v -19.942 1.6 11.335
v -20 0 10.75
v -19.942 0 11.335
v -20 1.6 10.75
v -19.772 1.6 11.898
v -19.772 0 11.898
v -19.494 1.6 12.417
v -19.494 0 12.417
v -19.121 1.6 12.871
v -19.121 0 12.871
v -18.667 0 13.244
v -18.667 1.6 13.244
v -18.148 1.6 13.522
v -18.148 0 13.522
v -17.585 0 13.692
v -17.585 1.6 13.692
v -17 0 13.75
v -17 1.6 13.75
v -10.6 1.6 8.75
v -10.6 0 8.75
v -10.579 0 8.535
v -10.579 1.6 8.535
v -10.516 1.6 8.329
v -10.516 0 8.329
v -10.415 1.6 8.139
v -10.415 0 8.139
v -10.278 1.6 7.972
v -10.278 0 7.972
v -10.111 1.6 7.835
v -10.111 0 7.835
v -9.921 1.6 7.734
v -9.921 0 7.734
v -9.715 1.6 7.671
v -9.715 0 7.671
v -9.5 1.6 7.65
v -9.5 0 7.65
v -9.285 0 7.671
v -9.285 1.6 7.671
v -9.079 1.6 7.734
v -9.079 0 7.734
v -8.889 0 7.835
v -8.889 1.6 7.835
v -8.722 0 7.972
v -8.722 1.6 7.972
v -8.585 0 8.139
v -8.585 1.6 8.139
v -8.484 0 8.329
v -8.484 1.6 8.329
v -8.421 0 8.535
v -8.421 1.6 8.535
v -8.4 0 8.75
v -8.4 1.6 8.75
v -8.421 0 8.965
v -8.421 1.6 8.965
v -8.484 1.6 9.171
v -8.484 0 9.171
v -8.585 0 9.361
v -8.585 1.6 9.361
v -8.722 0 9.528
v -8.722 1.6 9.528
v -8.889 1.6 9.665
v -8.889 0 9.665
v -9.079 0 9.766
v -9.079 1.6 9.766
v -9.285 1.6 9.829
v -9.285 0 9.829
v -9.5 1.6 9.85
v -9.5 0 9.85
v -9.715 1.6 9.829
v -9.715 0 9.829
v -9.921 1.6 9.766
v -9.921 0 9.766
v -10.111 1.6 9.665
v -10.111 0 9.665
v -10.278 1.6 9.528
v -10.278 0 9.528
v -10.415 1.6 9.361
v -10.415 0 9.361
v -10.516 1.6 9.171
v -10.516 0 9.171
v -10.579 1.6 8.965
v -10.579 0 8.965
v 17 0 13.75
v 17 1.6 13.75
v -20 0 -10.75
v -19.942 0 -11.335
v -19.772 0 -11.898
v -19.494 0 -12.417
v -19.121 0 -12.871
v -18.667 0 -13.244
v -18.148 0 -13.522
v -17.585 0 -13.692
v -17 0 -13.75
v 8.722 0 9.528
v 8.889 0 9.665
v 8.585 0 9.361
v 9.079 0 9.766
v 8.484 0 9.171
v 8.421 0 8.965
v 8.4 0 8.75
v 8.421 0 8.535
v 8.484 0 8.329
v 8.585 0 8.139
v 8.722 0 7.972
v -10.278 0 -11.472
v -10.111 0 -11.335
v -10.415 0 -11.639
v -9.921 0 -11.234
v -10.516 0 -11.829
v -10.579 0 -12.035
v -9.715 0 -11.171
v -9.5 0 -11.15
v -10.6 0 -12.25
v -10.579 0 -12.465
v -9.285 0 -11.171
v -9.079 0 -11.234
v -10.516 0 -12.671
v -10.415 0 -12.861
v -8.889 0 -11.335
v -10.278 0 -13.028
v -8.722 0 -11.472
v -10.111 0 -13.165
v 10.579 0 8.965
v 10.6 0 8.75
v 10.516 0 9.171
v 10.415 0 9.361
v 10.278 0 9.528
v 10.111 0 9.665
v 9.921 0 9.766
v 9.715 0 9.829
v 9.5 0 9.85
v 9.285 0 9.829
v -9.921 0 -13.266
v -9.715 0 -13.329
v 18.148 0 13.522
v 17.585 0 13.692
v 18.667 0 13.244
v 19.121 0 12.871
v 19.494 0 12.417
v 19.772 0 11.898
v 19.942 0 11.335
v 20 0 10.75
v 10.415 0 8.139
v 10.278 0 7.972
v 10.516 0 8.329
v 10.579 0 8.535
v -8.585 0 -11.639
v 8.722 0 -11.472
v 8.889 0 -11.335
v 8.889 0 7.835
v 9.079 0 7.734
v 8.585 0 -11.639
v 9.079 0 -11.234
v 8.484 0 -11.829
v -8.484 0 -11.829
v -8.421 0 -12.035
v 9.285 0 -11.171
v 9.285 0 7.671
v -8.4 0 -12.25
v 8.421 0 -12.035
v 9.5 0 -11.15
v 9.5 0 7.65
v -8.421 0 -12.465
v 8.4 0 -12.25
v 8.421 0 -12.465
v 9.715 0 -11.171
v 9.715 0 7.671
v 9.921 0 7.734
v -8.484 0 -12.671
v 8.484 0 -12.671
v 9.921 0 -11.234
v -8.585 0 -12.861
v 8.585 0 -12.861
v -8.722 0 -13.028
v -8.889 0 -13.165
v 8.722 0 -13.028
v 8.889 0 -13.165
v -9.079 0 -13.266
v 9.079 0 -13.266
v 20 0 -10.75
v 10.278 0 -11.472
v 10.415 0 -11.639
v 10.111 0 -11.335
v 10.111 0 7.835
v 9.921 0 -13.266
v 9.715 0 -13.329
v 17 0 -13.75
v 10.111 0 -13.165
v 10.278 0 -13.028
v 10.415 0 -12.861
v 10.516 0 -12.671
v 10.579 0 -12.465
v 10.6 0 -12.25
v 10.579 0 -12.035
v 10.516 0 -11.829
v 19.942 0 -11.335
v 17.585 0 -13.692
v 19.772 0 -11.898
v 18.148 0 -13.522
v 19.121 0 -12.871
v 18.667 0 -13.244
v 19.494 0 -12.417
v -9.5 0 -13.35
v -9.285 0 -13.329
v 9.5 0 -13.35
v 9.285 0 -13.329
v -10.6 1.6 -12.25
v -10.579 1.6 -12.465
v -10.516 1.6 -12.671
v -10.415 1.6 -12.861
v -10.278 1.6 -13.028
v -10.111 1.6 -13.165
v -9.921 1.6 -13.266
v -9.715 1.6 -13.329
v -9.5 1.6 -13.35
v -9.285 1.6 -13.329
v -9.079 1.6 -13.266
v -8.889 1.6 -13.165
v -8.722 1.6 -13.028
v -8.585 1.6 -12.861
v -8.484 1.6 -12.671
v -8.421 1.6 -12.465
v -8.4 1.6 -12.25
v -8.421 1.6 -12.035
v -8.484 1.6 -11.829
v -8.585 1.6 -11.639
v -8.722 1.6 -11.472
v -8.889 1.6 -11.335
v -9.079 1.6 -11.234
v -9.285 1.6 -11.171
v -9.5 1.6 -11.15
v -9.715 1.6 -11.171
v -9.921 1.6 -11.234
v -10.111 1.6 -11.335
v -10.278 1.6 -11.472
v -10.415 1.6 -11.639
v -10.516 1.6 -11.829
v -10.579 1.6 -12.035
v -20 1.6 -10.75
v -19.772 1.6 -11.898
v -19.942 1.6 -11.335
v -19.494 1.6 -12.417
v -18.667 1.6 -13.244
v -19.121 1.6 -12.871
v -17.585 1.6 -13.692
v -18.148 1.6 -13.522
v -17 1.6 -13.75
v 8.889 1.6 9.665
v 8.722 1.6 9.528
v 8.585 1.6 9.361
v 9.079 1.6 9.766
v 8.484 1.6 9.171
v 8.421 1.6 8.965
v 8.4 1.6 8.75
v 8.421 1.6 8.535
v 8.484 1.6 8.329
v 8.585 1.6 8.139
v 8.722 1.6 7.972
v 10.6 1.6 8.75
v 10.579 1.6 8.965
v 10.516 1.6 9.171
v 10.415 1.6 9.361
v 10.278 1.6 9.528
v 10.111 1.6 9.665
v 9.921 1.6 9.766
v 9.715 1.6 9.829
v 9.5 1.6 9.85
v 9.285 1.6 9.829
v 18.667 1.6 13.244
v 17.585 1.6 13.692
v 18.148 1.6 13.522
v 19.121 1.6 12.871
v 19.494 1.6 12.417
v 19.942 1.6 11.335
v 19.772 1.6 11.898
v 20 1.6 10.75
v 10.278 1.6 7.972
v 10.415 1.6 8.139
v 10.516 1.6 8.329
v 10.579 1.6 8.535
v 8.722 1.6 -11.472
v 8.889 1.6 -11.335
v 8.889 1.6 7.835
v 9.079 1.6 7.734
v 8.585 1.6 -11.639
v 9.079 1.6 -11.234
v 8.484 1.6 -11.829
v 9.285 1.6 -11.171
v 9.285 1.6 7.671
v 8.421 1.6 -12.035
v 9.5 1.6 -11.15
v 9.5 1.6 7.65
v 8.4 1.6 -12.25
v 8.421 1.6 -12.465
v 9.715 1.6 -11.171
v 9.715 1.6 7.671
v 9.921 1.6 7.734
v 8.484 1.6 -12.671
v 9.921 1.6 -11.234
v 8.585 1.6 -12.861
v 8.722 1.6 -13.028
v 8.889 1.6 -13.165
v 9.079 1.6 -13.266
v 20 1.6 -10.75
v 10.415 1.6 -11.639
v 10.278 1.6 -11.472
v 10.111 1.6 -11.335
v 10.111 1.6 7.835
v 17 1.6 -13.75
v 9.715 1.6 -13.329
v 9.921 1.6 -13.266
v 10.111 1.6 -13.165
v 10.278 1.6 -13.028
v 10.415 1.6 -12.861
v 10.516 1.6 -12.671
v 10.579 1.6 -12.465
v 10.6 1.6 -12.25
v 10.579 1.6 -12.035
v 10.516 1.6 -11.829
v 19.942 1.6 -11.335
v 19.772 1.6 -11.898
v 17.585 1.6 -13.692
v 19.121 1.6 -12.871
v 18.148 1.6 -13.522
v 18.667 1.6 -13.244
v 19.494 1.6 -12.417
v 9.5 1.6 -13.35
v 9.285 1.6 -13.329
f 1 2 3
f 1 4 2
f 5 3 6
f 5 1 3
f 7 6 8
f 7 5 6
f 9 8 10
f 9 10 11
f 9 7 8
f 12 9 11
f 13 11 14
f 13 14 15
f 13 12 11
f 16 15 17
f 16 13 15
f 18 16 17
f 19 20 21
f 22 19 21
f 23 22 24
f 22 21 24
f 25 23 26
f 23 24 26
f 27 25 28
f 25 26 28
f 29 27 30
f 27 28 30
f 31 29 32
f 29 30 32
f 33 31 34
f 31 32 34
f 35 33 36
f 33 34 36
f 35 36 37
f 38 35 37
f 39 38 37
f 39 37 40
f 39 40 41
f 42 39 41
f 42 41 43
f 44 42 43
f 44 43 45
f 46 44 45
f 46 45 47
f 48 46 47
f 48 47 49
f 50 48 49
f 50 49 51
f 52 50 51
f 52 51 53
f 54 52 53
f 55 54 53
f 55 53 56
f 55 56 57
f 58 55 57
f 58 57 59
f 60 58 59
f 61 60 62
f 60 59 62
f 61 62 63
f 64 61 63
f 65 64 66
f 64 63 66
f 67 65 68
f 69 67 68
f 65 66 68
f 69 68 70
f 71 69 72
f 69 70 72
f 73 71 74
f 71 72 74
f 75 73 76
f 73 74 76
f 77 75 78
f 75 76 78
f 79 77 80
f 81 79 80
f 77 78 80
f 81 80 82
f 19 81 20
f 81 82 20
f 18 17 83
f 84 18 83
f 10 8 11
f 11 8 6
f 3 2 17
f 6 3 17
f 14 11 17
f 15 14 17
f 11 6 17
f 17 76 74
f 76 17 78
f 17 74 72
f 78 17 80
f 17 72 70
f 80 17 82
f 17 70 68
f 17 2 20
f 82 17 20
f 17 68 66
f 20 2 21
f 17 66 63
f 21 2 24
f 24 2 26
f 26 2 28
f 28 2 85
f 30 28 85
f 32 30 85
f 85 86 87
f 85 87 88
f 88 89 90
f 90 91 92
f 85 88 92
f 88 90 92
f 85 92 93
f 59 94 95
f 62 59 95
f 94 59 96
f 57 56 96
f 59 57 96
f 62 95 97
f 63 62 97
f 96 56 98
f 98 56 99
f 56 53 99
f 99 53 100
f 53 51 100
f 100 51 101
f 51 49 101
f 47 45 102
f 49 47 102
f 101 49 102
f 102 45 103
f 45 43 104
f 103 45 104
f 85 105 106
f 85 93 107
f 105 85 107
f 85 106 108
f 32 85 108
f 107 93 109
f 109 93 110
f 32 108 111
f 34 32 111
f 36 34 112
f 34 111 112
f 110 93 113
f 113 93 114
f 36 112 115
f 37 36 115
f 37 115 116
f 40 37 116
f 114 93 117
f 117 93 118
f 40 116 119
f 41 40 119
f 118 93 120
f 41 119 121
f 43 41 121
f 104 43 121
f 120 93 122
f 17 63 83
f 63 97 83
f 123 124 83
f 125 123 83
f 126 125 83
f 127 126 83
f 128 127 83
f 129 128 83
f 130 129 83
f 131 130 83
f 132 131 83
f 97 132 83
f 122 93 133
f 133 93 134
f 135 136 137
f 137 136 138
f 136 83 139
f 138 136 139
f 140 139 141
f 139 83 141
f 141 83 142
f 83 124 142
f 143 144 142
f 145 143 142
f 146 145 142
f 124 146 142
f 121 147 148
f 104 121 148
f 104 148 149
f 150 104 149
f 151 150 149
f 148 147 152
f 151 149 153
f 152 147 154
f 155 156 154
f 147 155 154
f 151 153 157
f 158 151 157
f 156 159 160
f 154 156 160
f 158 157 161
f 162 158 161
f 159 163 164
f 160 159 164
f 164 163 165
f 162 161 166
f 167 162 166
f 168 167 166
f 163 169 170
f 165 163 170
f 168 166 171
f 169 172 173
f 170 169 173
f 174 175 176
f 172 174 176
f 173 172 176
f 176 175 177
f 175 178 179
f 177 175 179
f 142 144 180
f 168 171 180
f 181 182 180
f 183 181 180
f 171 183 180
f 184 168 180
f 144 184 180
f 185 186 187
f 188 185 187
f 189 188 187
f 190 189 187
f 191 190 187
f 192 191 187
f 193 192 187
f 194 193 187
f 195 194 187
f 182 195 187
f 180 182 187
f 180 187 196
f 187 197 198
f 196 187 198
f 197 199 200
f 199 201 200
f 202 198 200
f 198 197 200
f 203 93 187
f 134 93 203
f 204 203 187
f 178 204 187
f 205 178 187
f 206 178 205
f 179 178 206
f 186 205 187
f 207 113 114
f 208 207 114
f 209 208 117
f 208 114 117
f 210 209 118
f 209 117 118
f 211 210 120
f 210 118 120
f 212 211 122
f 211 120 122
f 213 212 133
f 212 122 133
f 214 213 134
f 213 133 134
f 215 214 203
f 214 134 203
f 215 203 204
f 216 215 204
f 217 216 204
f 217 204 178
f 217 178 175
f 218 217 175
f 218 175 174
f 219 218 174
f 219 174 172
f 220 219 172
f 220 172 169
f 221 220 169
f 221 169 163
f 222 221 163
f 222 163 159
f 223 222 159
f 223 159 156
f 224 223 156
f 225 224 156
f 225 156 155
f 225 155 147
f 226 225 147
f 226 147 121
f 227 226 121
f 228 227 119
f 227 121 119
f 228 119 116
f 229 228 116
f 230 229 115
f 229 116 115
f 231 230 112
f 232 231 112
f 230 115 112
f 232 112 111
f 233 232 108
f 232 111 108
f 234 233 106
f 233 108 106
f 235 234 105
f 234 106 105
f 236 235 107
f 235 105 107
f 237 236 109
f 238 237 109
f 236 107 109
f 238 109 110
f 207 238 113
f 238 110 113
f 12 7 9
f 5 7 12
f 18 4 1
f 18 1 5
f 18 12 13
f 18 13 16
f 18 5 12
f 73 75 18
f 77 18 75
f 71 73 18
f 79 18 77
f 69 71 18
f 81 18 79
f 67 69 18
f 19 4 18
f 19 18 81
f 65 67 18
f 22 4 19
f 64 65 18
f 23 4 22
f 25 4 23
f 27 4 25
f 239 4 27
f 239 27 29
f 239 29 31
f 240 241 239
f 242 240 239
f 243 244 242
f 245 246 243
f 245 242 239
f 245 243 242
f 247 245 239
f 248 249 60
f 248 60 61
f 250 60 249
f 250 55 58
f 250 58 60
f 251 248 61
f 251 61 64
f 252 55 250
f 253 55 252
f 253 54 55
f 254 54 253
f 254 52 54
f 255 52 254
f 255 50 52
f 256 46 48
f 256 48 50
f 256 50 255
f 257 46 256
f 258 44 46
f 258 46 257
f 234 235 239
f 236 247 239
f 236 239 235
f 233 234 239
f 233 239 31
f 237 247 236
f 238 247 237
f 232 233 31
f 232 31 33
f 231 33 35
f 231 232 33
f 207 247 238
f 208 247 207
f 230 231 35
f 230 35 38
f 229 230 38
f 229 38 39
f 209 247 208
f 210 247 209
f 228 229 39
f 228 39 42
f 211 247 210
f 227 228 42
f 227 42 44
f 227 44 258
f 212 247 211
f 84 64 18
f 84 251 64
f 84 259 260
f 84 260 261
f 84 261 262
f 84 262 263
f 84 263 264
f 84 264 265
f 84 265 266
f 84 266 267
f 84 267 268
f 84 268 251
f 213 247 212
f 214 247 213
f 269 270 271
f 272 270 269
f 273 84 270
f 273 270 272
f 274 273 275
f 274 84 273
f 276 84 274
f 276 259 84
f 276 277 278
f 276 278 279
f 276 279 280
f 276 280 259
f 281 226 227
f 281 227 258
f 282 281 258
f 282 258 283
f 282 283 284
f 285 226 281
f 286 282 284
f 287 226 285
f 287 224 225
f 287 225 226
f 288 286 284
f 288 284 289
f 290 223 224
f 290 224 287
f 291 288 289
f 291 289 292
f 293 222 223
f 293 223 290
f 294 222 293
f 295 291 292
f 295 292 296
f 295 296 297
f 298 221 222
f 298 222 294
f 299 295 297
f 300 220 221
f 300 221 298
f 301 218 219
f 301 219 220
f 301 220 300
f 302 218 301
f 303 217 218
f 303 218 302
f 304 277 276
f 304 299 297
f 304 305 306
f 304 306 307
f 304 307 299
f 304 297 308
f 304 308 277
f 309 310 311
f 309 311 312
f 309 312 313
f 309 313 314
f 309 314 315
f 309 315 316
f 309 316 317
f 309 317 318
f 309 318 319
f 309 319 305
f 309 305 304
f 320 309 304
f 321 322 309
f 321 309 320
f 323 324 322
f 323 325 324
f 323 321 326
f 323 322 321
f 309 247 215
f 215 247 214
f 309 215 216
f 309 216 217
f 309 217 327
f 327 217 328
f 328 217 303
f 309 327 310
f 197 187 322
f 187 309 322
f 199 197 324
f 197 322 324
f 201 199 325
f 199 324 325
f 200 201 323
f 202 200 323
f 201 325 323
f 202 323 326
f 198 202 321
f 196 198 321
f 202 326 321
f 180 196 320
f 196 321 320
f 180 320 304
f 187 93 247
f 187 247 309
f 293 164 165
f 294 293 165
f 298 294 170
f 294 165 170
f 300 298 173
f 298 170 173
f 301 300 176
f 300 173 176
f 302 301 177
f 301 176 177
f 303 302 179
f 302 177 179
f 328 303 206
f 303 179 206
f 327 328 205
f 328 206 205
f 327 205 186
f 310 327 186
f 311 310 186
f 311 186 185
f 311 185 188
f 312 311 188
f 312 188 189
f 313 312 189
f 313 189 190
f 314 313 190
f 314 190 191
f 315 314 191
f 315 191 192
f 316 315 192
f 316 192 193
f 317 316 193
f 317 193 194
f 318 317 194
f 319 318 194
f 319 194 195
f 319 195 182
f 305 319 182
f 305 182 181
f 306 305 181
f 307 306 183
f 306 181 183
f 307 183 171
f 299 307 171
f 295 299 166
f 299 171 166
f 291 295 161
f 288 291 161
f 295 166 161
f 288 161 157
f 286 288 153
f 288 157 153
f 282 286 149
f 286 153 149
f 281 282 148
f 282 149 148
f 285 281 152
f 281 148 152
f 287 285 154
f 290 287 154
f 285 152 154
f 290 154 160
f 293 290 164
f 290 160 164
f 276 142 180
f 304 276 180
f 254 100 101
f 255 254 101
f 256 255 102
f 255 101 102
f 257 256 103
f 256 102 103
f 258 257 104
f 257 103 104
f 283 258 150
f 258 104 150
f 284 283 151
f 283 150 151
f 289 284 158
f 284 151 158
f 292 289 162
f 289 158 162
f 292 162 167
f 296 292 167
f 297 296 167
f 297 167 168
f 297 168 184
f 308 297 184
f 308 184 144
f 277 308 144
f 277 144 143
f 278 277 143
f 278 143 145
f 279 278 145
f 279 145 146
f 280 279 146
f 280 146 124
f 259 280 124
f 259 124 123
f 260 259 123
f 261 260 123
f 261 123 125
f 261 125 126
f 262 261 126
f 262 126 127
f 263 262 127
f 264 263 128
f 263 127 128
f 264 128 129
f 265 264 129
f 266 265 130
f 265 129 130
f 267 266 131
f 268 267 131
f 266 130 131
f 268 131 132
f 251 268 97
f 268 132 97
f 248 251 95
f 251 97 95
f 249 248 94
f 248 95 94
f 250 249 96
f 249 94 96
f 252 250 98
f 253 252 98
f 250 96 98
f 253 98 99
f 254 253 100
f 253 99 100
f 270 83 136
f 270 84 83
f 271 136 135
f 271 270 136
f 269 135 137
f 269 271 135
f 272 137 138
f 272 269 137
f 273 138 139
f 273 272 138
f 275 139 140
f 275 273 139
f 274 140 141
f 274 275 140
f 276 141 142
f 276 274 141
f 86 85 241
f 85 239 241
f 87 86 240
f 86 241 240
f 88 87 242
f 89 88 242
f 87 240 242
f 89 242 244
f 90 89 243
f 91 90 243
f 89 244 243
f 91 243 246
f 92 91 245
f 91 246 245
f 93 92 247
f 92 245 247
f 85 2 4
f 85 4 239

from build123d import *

# Parameters (mm, degrees)
SKETCH1_W                = 40
SKETCH1_H                = 27.5
BOSS_EXTRUDE1_DEPTH      = 1.6
M2_CLEARANCE_HOLE1_D     = 2.2
M2_CLEARANCE_HOLE1_DEPTH = 5.2
M2_CLEARANCE_HOLE1_TIP   = 0.660946681
FILLET1_R                = 3


with BuildPart() as part:
    # Sketch1 → Boss-Extrude1 (new body)
    with BuildSketch(Plane(origin=(0, 0, 0), x_dir=(1, 0, 0), z_dir=(0, 1, 0))):
        Rectangle(SKETCH1_W, SKETCH1_H)
    extrude(amount=BOSS_EXTRUDE1_DEPTH)

    # M2 Clearance Hole1
    with Locations(Plane(origin=(0, 1.6, 0), x_dir=(1, 0, 0), z_dir=(0, 1, 0))):
        with Locations((-9.5, 12.25), (9.5, 12.25), (9.5, -8.75), (-9.5, -8.75)):
            Hole(M2_CLEARANCE_HOLE1_D / 2, depth=M2_CLEARANCE_HOLE1_DEPTH)
            with Locations((0, 0, -(M2_CLEARANCE_HOLE1_DEPTH + M2_CLEARANCE_HOLE1_TIP / 2))):  # 118° drill point
                Cone(0, M2_CLEARANCE_HOLE1_D / 2, M2_CLEARANCE_HOLE1_TIP, mode=Mode.SUBTRACT)

    # Fillet1
    fillet1_edges = [part.edges().sort_by_distance(p)[0] for p in [
        (-20, 0.8, -13.75),
        (20, 0.8, -13.75),
        (20, 0.8, 13.75),
        (-20, 0.8, 13.75),
    ]]
    fillet(fillet1_edges, radius=FILLET1_R)


solid = part.part
